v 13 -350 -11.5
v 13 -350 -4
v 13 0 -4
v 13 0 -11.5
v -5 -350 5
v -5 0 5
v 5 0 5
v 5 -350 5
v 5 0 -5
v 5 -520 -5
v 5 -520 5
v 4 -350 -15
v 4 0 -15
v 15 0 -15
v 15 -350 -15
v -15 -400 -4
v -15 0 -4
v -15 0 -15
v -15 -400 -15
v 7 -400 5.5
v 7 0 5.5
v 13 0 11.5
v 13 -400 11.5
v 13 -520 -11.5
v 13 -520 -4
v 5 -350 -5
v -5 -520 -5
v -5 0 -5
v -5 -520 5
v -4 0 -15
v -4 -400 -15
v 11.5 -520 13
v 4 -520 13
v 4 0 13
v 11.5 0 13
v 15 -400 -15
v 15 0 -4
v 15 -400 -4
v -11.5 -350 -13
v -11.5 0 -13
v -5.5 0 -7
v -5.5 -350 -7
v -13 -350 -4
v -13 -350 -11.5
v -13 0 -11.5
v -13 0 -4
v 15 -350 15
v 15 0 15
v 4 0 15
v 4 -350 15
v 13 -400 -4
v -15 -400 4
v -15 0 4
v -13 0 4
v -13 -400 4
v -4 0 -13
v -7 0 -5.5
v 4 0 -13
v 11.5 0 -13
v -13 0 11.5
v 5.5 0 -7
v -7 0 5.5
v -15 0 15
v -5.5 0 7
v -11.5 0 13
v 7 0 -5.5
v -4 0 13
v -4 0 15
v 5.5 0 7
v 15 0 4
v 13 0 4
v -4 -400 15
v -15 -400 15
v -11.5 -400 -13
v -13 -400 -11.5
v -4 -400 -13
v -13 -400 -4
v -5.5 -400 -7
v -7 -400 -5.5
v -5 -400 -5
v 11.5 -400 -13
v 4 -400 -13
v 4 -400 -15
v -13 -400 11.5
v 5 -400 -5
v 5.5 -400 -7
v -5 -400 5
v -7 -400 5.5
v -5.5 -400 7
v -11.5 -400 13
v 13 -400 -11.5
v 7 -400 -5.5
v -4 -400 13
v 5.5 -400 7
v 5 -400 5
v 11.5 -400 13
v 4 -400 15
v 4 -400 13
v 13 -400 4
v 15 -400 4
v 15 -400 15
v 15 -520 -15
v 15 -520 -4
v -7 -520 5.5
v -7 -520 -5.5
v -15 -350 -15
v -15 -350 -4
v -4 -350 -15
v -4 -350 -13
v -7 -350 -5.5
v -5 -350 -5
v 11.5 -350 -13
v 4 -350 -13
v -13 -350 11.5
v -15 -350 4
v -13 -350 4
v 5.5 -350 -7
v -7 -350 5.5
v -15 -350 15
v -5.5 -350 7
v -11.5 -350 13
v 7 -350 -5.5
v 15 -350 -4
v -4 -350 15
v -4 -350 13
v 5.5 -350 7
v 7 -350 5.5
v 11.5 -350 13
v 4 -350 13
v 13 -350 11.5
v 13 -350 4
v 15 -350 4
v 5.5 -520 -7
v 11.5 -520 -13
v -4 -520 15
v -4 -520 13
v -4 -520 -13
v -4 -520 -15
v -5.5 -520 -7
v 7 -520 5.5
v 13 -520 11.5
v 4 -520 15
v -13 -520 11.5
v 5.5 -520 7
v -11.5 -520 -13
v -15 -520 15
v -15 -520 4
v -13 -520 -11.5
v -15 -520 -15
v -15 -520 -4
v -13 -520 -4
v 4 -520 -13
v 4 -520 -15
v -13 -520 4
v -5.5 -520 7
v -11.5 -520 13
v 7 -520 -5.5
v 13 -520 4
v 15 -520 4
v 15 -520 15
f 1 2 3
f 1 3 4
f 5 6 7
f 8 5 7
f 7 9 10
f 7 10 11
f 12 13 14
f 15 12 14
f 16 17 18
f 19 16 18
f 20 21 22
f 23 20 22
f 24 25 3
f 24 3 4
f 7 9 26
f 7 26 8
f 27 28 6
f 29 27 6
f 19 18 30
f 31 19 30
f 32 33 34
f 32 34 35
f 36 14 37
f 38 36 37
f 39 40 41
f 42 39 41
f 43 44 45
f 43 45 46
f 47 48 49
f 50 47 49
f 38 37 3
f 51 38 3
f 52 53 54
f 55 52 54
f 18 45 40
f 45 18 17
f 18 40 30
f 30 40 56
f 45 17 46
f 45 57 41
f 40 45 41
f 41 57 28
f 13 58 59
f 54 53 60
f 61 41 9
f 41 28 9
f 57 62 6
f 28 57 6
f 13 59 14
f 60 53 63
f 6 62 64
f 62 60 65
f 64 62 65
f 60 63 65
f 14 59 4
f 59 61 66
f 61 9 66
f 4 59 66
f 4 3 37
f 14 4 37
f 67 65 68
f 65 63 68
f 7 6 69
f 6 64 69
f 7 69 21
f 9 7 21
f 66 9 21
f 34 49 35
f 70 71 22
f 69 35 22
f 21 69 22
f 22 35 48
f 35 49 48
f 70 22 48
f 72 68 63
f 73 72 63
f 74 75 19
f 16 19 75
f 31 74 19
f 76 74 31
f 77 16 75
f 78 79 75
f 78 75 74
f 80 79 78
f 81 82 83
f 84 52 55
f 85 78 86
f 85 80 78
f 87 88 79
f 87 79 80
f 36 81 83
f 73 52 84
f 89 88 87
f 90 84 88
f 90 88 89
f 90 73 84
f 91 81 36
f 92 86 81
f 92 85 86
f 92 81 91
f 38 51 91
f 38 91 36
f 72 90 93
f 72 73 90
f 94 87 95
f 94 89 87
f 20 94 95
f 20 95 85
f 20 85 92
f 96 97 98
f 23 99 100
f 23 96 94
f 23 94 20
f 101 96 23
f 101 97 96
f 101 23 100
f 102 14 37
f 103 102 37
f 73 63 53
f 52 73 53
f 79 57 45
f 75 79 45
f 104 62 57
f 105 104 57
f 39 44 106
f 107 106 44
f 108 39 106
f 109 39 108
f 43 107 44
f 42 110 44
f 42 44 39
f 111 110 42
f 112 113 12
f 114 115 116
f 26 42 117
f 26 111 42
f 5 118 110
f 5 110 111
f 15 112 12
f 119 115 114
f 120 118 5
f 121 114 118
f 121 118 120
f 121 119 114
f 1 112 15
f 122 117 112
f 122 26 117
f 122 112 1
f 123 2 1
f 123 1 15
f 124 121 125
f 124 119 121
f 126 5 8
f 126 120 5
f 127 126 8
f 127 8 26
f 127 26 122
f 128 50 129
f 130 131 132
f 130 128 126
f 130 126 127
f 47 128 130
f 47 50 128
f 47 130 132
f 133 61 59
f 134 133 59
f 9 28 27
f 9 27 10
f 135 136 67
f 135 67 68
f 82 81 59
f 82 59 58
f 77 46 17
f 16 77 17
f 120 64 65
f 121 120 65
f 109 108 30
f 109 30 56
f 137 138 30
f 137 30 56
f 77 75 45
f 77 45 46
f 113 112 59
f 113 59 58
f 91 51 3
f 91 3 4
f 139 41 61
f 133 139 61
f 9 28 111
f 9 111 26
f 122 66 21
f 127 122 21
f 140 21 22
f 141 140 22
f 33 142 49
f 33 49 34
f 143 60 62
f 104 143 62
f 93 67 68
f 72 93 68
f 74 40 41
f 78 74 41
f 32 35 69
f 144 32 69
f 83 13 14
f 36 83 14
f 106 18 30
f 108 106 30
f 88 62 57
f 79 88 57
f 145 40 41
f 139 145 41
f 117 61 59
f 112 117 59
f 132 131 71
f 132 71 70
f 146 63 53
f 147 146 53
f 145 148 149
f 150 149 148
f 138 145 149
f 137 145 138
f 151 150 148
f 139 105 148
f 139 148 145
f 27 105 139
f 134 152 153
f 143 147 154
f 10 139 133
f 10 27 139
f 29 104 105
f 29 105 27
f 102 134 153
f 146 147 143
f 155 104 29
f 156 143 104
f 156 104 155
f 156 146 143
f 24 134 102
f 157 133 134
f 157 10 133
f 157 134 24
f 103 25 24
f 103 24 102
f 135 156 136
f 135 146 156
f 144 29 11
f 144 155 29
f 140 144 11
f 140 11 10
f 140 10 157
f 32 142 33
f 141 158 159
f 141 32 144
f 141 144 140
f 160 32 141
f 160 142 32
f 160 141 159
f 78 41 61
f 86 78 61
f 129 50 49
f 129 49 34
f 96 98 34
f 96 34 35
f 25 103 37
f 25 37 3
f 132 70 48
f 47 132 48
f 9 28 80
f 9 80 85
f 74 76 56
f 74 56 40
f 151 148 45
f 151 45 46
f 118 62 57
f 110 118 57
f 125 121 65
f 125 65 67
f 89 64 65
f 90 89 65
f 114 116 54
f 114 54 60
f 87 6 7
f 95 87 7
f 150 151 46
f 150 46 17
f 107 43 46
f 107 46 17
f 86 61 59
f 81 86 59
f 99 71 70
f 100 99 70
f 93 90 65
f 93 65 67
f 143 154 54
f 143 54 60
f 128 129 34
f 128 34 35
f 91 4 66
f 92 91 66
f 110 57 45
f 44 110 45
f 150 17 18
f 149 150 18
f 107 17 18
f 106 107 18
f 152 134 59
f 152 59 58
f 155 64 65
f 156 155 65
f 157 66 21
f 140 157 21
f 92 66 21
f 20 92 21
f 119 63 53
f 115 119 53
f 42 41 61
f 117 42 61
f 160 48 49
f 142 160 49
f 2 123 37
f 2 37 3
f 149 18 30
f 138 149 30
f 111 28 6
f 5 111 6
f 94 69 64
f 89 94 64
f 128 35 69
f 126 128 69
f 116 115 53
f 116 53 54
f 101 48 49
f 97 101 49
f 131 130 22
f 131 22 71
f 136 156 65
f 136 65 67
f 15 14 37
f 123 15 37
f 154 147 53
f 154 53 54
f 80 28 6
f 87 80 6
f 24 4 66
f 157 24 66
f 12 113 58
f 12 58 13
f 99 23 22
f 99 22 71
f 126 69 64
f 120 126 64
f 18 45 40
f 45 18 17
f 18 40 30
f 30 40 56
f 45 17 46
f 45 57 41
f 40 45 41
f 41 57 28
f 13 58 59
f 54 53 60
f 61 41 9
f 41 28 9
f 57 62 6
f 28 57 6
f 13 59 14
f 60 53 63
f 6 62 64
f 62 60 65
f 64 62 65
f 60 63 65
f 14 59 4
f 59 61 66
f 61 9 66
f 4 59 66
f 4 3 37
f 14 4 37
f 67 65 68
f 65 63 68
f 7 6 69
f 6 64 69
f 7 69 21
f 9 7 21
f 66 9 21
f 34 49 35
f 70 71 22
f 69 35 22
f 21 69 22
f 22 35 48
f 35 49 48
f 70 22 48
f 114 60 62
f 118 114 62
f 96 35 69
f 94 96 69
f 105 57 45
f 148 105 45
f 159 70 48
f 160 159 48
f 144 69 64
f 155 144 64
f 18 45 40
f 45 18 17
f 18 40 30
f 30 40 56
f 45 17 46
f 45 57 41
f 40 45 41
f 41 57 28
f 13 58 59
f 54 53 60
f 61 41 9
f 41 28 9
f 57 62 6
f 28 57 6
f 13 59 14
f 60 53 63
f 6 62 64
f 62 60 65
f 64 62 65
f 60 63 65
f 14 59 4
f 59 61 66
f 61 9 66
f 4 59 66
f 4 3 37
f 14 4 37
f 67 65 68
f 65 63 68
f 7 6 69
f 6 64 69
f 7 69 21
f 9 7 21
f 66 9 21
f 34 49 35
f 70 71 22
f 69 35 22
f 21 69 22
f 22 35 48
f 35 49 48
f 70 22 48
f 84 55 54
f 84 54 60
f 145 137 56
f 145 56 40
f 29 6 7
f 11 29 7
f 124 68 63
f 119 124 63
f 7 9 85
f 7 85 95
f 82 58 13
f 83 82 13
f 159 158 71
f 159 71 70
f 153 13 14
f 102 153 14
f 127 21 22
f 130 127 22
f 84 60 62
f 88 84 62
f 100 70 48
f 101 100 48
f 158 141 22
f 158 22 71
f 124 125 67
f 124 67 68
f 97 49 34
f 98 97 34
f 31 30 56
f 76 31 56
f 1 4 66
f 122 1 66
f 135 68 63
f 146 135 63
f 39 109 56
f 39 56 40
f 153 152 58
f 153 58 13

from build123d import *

# Parameters (mm, degrees)
F0_W     = 10
F0_H     = 10
F1_DEPTH = 520
F2_DEPTH = 400
F3_DEPTH = 350


with BuildPart() as f1:
    # F0 (on Front) → F1 (new body)
    with BuildSketch(Plane.XZ):
        Polygon((-4, 15), (-15, 15), (-15, 4), (-13, 4), (-13, 11.5), (-7, 5.5), (-7, -5.5), (-13, -11.5), (-13, -4), (-15, -4), (-15, -15), (-4, -15), (-4, -13), (-11.5, -13), (-5.5, -7), (5.5, -7), (11.5, -13), (4, -13), (4, -15), (15, -15), (15, -4), (13, -4), (13, -11.5), (7, -5.5), (7, 5.5), (13, 11.5), (13, 4), (15, 4), (15, 15), (4, 15), (4, 13), (11.5, 13), (5.5, 7), (-5.5, 7), (-11.5, 13), (-4, 13), align=None)
        Rectangle(F0_W, F0_H, mode=Mode.SUBTRACT)
    extrude(amount=F1_DEPTH)


with BuildPart() as f2:
    # F0 (on Front) → F2 (new body)
    with BuildSketch(Plane.XZ):
        Polygon((-4, 15), (-15, 15), (-15, 4), (-13, 4), (-13, 11.5), (-7, 5.5), (-7, -5.5), (-13, -11.5), (-13, -4), (-15, -4), (-15, -15), (-4, -15), (-4, -13), (-11.5, -13), (-5.5, -7), (5.5, -7), (11.5, -13), (4, -13), (4, -15), (15, -15), (15, -4), (13, -4), (13, -11.5), (7, -5.5), (7, 5.5), (13, 11.5), (13, 4), (15, 4), (15, 15), (4, 15), (4, 13), (11.5, 13), (5.5, 7), (-5.5, 7), (-11.5, 13), (-4, 13), align=None)
        Rectangle(F0_W, F0_H, mode=Mode.SUBTRACT)
    extrude(amount=F2_DEPTH)


with BuildPart() as f3:
    # F0 (on Front) → F3 (new body)
    with BuildSketch(Plane.XZ):
        Polygon((-4, 15), (-15, 15), (-15, 4), (-13, 4), (-13, 11.5), (-7, 5.5), (-7, -5.5), (-13, -11.5), (-13, -4), (-15, -4), (-15, -15), (-4, -15), (-4, -13), (-11.5, -13), (-5.5, -7), (5.5, -7), (11.5, -13), (4, -13), (4, -15), (15, -15), (15, -4), (13, -4), (13, -11.5), (7, -5.5), (7, 5.5), (13, 11.5), (13, 4), (15, 4), (15, 15), (4, 15), (4, 13), (11.5, 13), (5.5, 7), (-5.5, 7), (-11.5, 13), (-4, 13), align=None)
        Rectangle(F0_W, F0_H, mode=Mode.SUBTRACT)
    extrude(amount=F3_DEPTH)


solid = Compound([f1.part, f2.part, f3.part])
